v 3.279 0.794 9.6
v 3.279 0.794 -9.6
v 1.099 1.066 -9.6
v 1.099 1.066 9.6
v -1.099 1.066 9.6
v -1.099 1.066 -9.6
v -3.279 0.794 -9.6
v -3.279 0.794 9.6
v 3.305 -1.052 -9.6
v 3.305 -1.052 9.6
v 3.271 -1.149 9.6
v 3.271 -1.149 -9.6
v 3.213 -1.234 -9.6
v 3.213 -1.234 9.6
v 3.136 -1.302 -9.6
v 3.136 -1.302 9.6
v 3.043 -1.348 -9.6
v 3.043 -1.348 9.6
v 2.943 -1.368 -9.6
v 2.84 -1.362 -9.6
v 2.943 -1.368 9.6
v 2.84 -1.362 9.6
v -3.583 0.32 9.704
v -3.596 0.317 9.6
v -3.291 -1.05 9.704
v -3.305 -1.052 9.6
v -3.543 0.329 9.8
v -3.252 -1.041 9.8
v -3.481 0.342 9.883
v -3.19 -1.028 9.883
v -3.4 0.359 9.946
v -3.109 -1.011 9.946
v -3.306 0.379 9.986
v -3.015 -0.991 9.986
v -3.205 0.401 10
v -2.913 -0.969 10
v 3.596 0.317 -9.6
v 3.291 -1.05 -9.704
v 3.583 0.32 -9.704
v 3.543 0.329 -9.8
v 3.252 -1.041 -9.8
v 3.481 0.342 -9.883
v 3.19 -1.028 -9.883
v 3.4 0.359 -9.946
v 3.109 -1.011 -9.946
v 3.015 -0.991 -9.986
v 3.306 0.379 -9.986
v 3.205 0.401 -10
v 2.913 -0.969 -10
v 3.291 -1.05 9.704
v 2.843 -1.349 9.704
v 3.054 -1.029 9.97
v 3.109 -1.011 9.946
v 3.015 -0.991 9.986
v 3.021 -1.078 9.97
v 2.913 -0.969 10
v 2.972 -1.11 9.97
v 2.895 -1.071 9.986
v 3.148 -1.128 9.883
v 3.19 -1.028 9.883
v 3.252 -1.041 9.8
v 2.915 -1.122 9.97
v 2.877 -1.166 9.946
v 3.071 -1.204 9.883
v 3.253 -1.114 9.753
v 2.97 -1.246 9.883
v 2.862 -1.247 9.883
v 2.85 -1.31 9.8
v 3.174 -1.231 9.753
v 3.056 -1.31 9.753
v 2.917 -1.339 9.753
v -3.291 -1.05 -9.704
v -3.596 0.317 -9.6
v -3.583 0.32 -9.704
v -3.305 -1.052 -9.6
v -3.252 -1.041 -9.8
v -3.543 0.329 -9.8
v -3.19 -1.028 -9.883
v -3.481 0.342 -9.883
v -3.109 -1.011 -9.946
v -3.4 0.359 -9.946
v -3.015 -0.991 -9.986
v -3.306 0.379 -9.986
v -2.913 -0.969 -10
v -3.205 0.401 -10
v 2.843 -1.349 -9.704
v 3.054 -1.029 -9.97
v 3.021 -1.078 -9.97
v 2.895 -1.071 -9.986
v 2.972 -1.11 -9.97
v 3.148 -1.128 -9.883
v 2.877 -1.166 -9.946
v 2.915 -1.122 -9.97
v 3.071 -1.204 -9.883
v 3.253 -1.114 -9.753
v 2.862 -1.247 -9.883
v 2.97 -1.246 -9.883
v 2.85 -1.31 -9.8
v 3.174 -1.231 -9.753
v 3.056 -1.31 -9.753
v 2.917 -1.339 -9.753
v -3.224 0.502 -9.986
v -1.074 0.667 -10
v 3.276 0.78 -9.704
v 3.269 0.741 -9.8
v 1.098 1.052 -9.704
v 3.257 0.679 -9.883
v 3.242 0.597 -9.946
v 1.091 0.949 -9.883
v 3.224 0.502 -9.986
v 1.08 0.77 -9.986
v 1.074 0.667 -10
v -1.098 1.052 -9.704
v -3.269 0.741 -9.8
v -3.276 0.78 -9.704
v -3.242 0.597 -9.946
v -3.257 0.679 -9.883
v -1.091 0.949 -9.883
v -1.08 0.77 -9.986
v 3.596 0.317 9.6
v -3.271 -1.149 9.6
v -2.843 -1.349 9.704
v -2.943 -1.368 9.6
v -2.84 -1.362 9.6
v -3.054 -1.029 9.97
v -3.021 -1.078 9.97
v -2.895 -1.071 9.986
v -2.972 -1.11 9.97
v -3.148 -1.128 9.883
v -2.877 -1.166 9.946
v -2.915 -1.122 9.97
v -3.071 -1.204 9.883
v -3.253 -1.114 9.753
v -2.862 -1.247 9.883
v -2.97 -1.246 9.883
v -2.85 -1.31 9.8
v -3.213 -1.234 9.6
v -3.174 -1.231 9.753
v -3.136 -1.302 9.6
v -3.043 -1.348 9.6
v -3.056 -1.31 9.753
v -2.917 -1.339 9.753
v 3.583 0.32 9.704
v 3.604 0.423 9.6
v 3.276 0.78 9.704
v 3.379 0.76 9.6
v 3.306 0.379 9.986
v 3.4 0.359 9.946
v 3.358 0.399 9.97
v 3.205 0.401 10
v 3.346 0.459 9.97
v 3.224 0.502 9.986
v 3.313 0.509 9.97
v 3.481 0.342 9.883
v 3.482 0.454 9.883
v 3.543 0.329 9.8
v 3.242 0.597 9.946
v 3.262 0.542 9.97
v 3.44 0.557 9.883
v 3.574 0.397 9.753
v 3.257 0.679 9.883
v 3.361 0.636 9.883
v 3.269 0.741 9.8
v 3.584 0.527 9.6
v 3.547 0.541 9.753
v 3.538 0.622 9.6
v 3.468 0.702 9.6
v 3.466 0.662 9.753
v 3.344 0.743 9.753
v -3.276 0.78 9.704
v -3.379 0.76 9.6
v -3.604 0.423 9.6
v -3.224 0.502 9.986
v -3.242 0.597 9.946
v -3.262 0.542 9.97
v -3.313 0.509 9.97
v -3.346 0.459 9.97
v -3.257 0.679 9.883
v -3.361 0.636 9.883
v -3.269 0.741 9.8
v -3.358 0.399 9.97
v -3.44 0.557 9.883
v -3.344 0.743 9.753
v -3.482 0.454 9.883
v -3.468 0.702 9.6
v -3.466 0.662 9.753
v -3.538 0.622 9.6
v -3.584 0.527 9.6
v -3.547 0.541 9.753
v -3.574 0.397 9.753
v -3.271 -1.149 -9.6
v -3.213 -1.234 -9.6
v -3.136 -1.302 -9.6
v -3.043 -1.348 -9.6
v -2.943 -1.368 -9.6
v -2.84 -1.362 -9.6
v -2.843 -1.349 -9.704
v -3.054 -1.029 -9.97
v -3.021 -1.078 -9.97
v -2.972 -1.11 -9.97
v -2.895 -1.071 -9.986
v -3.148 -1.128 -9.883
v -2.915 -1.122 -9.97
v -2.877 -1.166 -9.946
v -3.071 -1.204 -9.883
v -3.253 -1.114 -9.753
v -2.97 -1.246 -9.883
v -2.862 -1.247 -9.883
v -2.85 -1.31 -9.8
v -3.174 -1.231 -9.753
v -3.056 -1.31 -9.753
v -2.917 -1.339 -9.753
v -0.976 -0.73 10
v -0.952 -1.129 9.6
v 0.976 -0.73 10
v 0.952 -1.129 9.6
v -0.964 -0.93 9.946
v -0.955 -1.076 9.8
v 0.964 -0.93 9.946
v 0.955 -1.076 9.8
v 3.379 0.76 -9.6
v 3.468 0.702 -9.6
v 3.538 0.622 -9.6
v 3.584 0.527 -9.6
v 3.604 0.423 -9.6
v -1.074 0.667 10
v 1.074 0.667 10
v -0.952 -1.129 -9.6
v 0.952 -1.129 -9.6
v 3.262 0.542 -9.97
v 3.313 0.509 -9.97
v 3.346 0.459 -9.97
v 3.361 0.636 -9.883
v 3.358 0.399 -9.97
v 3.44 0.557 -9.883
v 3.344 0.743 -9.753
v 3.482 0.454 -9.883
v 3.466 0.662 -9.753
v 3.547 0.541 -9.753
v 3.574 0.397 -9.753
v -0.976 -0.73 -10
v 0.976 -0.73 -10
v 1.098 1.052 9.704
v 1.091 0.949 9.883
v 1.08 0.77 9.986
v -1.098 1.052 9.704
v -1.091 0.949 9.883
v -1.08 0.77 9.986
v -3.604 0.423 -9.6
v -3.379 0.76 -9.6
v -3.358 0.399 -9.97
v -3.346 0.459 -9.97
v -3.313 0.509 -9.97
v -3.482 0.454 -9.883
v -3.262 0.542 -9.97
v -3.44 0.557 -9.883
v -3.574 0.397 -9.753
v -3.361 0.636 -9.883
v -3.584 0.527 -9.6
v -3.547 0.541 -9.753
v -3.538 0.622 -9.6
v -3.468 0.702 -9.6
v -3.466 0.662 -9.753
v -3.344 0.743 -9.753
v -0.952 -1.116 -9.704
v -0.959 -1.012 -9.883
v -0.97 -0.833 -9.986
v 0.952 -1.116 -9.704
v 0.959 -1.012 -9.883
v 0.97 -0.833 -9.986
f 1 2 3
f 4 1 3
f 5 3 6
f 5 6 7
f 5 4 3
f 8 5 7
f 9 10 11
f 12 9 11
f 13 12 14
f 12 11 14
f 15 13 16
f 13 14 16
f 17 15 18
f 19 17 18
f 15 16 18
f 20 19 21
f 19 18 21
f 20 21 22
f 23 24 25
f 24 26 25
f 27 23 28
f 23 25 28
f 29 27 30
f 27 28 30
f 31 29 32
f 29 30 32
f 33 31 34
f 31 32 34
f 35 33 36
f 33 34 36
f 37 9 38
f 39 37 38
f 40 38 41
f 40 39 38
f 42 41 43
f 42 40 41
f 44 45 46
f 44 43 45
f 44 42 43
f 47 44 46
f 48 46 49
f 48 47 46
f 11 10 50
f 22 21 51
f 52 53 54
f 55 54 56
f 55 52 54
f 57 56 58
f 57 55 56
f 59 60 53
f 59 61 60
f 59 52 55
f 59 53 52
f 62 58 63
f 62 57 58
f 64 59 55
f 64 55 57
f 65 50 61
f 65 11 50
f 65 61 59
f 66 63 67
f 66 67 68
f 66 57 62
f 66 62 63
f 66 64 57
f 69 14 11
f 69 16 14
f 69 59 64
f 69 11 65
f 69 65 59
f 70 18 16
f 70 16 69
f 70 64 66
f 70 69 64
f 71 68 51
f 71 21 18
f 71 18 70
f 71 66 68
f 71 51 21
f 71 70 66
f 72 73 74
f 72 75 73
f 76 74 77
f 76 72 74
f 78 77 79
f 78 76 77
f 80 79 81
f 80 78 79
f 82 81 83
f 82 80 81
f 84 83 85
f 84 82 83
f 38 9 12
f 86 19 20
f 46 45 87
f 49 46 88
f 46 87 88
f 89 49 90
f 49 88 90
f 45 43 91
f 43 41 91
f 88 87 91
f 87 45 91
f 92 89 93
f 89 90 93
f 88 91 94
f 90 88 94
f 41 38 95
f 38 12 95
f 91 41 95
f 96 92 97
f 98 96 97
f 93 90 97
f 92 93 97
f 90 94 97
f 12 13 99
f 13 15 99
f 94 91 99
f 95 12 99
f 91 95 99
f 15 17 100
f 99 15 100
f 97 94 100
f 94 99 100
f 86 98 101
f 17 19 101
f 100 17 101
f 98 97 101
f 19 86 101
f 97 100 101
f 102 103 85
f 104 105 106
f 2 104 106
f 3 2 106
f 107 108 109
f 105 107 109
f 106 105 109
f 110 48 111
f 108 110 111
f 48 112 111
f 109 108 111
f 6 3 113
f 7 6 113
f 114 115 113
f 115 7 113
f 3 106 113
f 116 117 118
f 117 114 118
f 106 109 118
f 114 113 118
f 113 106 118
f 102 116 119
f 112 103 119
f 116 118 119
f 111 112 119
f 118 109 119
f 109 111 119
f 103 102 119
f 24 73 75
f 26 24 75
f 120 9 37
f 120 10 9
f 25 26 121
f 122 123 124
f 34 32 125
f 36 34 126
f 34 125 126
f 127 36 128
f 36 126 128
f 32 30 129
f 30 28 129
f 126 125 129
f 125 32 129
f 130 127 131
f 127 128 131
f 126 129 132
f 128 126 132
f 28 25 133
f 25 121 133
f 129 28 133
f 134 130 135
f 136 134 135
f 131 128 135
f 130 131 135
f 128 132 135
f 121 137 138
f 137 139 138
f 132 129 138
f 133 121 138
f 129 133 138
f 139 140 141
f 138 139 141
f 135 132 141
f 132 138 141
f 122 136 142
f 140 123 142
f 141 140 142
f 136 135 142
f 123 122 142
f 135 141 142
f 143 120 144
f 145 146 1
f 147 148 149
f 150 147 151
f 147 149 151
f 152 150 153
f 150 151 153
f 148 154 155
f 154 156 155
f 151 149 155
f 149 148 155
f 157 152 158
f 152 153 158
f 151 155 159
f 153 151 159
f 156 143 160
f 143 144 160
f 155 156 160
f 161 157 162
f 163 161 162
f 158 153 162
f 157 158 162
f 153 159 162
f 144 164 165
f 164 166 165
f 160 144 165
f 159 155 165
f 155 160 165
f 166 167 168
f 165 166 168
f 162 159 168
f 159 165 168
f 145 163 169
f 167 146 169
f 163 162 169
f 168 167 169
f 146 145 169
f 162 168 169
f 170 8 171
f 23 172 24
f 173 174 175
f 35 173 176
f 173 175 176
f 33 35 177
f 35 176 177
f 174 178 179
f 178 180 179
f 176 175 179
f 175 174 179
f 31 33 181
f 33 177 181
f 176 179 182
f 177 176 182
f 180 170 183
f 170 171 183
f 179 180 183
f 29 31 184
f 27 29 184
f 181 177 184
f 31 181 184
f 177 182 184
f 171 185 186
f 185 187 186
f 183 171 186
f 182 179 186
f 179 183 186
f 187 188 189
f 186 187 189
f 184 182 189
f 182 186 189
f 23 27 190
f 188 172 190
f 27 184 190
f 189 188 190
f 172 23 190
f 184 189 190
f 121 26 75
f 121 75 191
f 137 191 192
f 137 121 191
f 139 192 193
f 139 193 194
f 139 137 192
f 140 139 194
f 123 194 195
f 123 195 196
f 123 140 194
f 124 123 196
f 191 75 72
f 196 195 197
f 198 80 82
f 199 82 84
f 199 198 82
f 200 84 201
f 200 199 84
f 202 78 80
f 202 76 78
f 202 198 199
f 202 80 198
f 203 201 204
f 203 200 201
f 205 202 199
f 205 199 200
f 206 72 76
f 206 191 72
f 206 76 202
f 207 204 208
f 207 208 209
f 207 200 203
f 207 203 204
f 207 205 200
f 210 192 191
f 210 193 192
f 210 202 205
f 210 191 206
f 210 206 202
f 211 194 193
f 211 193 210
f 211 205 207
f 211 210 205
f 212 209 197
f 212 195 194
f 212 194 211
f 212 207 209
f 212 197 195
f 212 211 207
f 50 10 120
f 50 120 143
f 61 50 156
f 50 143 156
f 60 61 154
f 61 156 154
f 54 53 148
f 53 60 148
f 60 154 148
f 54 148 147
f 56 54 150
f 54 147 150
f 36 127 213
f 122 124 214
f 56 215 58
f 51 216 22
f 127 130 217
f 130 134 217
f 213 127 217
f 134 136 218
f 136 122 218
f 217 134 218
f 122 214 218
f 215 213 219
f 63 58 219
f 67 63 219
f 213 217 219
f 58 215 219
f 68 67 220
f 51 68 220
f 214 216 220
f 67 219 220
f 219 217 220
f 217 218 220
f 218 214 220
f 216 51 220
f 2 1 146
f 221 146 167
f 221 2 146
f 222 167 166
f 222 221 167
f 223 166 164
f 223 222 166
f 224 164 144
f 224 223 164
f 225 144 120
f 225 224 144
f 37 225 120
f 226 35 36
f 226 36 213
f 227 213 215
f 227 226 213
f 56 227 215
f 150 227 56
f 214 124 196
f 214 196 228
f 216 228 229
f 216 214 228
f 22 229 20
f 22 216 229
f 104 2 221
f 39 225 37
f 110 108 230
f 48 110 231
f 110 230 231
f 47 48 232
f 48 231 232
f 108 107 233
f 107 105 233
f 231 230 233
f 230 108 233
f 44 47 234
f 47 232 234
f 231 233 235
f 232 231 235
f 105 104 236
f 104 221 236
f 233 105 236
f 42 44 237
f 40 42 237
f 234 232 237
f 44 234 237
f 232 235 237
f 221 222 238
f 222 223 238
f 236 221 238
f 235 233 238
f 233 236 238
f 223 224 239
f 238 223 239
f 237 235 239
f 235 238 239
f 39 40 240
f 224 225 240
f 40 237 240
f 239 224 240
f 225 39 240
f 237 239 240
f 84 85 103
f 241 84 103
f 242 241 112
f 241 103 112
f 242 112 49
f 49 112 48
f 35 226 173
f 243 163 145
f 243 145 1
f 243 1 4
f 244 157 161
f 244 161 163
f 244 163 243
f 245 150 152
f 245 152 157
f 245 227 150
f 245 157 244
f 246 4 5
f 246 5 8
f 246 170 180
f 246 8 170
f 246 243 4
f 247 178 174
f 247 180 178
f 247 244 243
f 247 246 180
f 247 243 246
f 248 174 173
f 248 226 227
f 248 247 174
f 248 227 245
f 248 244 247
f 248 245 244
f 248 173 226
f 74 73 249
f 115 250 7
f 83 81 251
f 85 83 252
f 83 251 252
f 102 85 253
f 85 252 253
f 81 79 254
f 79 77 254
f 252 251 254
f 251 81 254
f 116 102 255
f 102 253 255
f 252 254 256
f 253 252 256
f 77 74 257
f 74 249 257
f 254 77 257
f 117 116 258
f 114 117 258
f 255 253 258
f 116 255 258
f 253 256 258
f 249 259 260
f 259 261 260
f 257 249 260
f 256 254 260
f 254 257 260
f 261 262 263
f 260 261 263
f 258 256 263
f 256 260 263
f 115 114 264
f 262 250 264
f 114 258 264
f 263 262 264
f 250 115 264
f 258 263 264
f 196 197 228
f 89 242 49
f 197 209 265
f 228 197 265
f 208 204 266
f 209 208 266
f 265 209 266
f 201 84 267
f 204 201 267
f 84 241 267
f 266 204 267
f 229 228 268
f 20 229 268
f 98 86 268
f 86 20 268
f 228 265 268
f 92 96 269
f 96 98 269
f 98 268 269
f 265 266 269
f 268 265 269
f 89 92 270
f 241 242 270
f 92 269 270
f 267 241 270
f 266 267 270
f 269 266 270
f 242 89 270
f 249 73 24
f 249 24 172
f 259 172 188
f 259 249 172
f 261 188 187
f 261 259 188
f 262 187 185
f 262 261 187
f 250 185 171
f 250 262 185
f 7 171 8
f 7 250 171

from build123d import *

# Parameters (mm, degrees)
BOSS_EXTRUDE2_DEPTH = 10
FILLET1_R           = 0.4


with BuildPart() as part:
    # Sketch4 → Boss-Extrude2 (new, symmetric)
    with BuildSketch(Plane.XY):
        with BuildLine():
            Line((-3.680036927, 0.713212533), (-3.222631208, -1.438712189))
            ThreePointArc((-3.222631208, -1.438712189), (0, -1.1), (3.222631208, -1.438712189))
            Line((3.222631208, -1.438712189), (3.680036927, 0.713212533))
            ThreePointArc((3.680036927, 0.713212533), (0, 1.1), (-3.680036927, 0.713212533))
        make_face()
    extrude(amount=BOSS_EXTRUDE2_DEPTH, both=True)

    # Fillet1
    fillet1_edges = [part.edges().sort_by_distance(p)[0] for p in [
        (0, 1.1, 10),
        (-3.451334068, -0.362749828, 10),
        (0, -1.1, 10),
        (-3.451334068, -0.362749828, -10),
        (0, 1.1, -10),
        (3.451334068, -0.362749828, -10),
        (0, -1.1, -10),
        (-3.222631208, -1.438712189, 0),
        (-3.680036927, 0.713212533, 0),
        (3.680036927, 0.713212533, 0),
        (3.222631208, -1.438712189, 0),
        (3.451334068, -0.362749828, 10),
    ]]
    fillet(fillet1_edges, radius=FILLET1_R)


solid = part.part
